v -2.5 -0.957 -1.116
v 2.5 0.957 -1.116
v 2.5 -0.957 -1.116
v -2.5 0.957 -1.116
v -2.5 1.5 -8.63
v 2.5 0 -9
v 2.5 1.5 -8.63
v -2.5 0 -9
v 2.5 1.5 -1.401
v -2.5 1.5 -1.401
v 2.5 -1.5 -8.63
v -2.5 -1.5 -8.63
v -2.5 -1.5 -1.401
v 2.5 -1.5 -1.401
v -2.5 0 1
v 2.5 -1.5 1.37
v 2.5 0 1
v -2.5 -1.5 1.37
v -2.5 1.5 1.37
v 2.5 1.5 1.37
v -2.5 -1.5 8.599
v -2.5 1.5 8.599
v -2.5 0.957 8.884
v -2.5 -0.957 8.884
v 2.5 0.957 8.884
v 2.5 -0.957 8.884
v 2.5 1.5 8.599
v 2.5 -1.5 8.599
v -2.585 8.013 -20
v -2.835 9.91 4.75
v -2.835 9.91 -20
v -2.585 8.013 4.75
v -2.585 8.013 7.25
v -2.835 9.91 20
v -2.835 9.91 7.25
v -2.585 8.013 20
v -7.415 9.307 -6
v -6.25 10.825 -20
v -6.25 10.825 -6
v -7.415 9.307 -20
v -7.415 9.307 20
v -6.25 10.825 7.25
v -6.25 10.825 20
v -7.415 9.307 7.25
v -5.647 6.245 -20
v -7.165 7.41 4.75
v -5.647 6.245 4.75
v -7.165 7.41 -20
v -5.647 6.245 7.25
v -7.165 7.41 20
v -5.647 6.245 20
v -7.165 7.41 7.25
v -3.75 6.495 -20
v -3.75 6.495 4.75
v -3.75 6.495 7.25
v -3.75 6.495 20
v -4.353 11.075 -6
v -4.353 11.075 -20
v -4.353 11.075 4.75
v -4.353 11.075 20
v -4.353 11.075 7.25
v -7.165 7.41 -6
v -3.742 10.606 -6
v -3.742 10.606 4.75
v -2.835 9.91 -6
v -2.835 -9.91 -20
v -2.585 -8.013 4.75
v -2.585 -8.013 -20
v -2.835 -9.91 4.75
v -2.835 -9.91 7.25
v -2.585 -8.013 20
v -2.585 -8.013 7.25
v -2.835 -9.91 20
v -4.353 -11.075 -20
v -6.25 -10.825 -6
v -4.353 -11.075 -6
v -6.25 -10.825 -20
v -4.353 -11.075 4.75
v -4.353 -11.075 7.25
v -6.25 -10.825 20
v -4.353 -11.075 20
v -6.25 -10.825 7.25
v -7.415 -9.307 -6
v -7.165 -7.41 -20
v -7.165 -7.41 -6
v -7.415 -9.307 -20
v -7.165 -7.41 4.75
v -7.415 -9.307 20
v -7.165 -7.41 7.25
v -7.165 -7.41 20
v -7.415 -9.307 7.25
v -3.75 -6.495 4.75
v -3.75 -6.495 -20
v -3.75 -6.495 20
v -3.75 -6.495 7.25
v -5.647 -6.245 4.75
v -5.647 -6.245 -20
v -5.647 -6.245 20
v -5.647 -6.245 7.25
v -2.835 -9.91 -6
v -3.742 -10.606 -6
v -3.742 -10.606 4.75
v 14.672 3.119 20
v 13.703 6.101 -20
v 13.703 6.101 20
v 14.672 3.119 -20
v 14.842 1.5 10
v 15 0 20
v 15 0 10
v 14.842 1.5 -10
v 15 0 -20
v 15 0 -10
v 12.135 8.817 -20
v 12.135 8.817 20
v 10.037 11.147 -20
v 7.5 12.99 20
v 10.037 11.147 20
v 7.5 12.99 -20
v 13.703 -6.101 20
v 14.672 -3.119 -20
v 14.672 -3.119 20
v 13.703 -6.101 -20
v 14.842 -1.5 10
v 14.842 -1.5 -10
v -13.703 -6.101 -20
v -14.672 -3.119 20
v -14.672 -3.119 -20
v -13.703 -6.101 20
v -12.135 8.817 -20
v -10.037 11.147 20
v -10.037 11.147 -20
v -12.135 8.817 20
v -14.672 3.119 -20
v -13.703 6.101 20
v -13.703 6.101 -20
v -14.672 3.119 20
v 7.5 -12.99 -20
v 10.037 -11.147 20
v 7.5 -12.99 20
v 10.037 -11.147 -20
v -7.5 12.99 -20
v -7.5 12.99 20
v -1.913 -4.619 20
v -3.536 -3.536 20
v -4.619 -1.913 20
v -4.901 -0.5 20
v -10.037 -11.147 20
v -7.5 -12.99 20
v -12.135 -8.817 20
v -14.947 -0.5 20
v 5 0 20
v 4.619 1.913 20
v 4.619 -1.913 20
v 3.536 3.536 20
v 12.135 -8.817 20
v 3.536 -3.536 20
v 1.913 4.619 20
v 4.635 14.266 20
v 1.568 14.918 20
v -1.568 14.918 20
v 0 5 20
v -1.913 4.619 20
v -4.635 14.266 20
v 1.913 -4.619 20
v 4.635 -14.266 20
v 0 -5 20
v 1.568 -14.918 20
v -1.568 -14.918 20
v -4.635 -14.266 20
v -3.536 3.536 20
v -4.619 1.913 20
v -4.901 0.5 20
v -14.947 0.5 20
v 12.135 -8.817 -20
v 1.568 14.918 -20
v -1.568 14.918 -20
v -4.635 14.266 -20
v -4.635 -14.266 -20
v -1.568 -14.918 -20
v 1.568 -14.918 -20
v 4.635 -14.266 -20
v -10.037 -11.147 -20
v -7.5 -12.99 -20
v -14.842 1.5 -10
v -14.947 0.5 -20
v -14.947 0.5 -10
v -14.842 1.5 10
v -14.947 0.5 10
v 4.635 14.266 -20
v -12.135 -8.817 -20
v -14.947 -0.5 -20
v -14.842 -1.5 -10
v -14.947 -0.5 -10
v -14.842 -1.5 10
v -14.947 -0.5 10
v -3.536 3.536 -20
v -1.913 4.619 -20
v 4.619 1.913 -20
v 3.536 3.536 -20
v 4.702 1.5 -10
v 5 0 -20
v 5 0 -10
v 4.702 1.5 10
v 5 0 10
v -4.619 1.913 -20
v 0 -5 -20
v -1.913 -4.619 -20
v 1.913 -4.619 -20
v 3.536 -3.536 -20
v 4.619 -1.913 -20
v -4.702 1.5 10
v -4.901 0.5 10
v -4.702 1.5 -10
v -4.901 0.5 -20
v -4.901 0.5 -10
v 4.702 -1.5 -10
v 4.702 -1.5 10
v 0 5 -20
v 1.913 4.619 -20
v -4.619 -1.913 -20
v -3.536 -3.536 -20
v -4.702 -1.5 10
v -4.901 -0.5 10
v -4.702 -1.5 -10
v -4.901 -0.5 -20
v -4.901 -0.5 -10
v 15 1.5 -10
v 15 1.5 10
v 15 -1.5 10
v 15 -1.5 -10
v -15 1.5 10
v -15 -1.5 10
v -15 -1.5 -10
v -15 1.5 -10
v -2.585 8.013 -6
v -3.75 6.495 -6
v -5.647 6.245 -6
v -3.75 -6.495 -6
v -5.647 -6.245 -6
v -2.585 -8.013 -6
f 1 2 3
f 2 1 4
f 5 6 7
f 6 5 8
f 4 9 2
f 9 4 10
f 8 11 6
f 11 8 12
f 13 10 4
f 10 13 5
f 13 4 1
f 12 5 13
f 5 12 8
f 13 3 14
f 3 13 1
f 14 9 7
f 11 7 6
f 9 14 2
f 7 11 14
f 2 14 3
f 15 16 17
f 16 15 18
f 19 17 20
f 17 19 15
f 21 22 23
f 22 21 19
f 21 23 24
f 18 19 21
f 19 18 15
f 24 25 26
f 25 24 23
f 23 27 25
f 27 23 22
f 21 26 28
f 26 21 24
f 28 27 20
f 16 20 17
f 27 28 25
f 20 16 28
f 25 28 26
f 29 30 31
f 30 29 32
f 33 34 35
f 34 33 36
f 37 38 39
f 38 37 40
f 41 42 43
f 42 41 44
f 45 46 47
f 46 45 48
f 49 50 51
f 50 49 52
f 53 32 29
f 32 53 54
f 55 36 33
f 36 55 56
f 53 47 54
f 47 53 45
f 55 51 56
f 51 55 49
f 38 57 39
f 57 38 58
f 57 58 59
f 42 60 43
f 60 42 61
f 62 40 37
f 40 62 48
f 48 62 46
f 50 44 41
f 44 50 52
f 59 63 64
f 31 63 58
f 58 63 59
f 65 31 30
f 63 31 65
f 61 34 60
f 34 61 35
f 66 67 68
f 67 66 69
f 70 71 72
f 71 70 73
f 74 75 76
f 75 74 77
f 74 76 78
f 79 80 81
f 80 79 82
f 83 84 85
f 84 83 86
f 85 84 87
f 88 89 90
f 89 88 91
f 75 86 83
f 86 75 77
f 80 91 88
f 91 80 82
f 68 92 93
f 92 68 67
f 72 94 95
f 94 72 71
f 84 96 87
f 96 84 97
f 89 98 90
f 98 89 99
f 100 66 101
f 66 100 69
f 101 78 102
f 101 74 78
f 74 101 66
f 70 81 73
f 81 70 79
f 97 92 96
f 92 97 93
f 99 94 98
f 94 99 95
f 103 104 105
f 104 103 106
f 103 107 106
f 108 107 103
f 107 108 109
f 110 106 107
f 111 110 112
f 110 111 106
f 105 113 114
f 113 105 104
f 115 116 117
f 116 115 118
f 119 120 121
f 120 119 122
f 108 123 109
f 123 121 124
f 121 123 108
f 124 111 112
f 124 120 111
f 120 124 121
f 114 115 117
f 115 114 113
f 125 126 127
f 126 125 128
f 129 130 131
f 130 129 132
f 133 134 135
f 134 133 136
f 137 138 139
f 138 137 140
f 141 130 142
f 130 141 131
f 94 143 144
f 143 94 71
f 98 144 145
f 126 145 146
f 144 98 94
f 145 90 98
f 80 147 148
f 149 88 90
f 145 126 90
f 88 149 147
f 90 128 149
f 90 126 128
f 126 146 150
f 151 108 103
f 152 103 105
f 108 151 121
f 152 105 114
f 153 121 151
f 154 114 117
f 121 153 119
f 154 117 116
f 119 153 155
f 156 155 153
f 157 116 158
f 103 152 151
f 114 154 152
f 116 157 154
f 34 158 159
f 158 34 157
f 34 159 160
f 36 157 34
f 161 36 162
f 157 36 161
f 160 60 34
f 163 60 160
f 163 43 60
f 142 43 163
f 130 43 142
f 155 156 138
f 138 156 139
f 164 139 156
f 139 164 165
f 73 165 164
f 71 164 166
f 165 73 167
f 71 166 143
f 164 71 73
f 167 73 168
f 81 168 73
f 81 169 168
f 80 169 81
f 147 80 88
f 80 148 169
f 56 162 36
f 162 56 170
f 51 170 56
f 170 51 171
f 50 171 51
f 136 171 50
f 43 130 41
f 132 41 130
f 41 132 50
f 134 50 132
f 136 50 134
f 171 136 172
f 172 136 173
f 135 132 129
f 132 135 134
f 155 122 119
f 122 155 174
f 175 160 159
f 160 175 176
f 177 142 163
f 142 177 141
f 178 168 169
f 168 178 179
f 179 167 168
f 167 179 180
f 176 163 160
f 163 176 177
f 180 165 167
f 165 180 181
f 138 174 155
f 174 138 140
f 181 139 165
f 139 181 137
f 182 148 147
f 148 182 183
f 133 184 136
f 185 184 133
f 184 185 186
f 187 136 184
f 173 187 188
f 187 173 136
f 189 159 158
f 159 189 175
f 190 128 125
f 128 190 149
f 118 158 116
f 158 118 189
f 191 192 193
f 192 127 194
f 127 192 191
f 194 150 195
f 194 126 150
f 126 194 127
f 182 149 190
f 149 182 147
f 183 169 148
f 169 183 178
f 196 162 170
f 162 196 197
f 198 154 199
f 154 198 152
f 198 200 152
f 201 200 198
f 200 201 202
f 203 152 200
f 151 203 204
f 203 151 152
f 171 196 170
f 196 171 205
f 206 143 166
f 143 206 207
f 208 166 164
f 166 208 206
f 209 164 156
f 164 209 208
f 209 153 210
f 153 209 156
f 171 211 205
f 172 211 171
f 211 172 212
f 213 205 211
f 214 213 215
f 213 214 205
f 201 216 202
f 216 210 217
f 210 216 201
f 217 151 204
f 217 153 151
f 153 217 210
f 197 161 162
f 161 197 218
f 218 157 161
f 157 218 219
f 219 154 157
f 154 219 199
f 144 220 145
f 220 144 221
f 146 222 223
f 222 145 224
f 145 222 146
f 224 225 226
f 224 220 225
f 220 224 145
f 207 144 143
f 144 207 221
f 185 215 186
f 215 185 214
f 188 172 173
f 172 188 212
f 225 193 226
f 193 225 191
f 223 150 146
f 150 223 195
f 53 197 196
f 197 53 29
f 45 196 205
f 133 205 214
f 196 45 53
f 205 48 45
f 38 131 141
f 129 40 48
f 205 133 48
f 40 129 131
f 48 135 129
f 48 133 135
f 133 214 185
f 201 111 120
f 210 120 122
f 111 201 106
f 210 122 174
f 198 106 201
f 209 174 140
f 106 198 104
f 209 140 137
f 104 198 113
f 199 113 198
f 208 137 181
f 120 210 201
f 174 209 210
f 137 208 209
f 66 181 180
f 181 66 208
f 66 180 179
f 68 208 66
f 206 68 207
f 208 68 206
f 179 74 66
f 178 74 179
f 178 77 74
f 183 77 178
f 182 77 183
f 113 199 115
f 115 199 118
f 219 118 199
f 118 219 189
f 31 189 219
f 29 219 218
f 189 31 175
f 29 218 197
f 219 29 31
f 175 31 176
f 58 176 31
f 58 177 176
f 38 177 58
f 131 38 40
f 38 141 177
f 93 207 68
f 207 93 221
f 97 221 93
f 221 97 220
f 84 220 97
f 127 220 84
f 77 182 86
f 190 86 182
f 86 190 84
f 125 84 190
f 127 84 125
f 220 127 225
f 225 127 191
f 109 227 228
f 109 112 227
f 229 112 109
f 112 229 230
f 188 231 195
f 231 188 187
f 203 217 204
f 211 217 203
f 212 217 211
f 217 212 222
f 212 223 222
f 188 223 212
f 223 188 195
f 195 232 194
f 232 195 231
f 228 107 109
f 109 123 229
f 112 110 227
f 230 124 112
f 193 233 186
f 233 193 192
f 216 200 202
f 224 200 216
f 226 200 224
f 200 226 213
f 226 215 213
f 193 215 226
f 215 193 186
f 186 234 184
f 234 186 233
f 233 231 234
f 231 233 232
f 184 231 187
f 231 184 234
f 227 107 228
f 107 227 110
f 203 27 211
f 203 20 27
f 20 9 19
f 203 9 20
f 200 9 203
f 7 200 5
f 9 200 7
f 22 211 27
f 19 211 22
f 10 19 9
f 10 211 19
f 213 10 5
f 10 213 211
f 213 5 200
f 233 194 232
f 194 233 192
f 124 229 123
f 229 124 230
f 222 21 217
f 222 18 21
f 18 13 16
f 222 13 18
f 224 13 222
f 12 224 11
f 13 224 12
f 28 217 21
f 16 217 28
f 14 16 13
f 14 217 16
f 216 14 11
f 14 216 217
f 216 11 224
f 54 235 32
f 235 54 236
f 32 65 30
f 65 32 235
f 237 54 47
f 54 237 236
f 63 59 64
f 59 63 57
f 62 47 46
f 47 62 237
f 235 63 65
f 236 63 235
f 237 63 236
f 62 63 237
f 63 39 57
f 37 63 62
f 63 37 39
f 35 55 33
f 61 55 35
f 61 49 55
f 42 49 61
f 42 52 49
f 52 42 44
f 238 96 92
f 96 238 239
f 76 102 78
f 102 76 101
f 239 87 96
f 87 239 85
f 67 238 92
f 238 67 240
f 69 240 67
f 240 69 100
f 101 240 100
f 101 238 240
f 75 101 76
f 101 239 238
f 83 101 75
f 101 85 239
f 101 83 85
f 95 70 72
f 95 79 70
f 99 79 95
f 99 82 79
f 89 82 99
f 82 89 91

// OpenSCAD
// Parameters
clamp_diameter = 30;
clamp_length = 20;
shaft_hole_diameter = 10;
fastener_hole_diameter = 5;
fastener_hole_offset = 10;
slit_width = 1;
cutout_depth = 5;
cutout_width = 8;
flexible_element_thickness = 3;
screw_head_diameter = 8;
screw_length = 12;
groove_depth = 3;
groove_width = 5;

// Module for a single clamping half
module clamping_half() {
    difference() {
        // Main cylindrical body
        cylinder(d=clamp_diameter, h=clamp_length, center=true);
        
        // Shaft hole
        cylinder(d=shaft_hole_diameter, h=clamp_length+2, center=true);
        
        // Fastener holes
        for (angle = [120, 240]) {
            rotate([0, 0, angle])
                translate([fastener_hole_offset, 0, 0])
                cylinder(d=fastener_hole_diameter, h=clamp_length+2, center=true);
        }
        
        // Slit for clamping action
        translate([-clamp_diameter/2, 0, 0])
            cube([clamp_diameter, slit_width, clamp_length+2], center=true);
        
        // Side cutouts for flexible element
        for (z_offset = [-clamp_length/4, clamp_length/4]) {
            translate([0, 0, z_offset])
                rotate([0, 90, 0])
                cylinder(d=cutout_width, h=cutout_depth, center=true);
        }
        
        // Additional grooves for flexibility
        for (z_offset = [-clamp_length/3, clamp_length/3]) {
            translate([0, 0, z_offset])
                rotate([0, 90, 0])
                cylinder(d=groove_width, h=groove_depth, center=true);
        }
    }
}

// Module for the flexible element
module flexible_element() {
    difference() {
        // Main flexible insert
        cube([clamp_diameter, flexible_element_thickness, clamp_length], center=true);
        
        // Cutouts to fit into the clamping halves
        for (z_offset = [-clamp_length/4, clamp_length/4]) {
            translate([0, 0, z_offset])
                rotate([0, 90, 0])
                cylinder(d=cutout_width, h=cutout_depth, center=true);
        }
    }
}

// Module for fastening screws
module fastening_screw() {
    union() {
        // Screw body
        cylinder(d=fastener_hole_diameter, h=screw_length, center=true);
        
        // Screw head
        translate([0, 0, screw_length/2])
            cylinder(d=screw_head_diameter, h=fastener_hole_diameter/2, center=true);
    }
}

// Assemble the coupling
module flexible_coupling() {
    // Top clamping half
    translate([0, 0, clamp_length/2])
        clamping_half();
    
    // Bottom clamping half (mirrored)
    translate([0, 0, -clamp_length/2])
        mirror([0, 0, 1])
        clamping_half();
    
    // Flexible element
    flexible_element();
    
    // Fastening screws
    for (angle = [120, 240]) {
        rotate([0, 0, angle])
            translate([fastener_hole_offset, 0, 0])
            fastening_screw();
    }
}

// Render the model
flexible_coupling();
